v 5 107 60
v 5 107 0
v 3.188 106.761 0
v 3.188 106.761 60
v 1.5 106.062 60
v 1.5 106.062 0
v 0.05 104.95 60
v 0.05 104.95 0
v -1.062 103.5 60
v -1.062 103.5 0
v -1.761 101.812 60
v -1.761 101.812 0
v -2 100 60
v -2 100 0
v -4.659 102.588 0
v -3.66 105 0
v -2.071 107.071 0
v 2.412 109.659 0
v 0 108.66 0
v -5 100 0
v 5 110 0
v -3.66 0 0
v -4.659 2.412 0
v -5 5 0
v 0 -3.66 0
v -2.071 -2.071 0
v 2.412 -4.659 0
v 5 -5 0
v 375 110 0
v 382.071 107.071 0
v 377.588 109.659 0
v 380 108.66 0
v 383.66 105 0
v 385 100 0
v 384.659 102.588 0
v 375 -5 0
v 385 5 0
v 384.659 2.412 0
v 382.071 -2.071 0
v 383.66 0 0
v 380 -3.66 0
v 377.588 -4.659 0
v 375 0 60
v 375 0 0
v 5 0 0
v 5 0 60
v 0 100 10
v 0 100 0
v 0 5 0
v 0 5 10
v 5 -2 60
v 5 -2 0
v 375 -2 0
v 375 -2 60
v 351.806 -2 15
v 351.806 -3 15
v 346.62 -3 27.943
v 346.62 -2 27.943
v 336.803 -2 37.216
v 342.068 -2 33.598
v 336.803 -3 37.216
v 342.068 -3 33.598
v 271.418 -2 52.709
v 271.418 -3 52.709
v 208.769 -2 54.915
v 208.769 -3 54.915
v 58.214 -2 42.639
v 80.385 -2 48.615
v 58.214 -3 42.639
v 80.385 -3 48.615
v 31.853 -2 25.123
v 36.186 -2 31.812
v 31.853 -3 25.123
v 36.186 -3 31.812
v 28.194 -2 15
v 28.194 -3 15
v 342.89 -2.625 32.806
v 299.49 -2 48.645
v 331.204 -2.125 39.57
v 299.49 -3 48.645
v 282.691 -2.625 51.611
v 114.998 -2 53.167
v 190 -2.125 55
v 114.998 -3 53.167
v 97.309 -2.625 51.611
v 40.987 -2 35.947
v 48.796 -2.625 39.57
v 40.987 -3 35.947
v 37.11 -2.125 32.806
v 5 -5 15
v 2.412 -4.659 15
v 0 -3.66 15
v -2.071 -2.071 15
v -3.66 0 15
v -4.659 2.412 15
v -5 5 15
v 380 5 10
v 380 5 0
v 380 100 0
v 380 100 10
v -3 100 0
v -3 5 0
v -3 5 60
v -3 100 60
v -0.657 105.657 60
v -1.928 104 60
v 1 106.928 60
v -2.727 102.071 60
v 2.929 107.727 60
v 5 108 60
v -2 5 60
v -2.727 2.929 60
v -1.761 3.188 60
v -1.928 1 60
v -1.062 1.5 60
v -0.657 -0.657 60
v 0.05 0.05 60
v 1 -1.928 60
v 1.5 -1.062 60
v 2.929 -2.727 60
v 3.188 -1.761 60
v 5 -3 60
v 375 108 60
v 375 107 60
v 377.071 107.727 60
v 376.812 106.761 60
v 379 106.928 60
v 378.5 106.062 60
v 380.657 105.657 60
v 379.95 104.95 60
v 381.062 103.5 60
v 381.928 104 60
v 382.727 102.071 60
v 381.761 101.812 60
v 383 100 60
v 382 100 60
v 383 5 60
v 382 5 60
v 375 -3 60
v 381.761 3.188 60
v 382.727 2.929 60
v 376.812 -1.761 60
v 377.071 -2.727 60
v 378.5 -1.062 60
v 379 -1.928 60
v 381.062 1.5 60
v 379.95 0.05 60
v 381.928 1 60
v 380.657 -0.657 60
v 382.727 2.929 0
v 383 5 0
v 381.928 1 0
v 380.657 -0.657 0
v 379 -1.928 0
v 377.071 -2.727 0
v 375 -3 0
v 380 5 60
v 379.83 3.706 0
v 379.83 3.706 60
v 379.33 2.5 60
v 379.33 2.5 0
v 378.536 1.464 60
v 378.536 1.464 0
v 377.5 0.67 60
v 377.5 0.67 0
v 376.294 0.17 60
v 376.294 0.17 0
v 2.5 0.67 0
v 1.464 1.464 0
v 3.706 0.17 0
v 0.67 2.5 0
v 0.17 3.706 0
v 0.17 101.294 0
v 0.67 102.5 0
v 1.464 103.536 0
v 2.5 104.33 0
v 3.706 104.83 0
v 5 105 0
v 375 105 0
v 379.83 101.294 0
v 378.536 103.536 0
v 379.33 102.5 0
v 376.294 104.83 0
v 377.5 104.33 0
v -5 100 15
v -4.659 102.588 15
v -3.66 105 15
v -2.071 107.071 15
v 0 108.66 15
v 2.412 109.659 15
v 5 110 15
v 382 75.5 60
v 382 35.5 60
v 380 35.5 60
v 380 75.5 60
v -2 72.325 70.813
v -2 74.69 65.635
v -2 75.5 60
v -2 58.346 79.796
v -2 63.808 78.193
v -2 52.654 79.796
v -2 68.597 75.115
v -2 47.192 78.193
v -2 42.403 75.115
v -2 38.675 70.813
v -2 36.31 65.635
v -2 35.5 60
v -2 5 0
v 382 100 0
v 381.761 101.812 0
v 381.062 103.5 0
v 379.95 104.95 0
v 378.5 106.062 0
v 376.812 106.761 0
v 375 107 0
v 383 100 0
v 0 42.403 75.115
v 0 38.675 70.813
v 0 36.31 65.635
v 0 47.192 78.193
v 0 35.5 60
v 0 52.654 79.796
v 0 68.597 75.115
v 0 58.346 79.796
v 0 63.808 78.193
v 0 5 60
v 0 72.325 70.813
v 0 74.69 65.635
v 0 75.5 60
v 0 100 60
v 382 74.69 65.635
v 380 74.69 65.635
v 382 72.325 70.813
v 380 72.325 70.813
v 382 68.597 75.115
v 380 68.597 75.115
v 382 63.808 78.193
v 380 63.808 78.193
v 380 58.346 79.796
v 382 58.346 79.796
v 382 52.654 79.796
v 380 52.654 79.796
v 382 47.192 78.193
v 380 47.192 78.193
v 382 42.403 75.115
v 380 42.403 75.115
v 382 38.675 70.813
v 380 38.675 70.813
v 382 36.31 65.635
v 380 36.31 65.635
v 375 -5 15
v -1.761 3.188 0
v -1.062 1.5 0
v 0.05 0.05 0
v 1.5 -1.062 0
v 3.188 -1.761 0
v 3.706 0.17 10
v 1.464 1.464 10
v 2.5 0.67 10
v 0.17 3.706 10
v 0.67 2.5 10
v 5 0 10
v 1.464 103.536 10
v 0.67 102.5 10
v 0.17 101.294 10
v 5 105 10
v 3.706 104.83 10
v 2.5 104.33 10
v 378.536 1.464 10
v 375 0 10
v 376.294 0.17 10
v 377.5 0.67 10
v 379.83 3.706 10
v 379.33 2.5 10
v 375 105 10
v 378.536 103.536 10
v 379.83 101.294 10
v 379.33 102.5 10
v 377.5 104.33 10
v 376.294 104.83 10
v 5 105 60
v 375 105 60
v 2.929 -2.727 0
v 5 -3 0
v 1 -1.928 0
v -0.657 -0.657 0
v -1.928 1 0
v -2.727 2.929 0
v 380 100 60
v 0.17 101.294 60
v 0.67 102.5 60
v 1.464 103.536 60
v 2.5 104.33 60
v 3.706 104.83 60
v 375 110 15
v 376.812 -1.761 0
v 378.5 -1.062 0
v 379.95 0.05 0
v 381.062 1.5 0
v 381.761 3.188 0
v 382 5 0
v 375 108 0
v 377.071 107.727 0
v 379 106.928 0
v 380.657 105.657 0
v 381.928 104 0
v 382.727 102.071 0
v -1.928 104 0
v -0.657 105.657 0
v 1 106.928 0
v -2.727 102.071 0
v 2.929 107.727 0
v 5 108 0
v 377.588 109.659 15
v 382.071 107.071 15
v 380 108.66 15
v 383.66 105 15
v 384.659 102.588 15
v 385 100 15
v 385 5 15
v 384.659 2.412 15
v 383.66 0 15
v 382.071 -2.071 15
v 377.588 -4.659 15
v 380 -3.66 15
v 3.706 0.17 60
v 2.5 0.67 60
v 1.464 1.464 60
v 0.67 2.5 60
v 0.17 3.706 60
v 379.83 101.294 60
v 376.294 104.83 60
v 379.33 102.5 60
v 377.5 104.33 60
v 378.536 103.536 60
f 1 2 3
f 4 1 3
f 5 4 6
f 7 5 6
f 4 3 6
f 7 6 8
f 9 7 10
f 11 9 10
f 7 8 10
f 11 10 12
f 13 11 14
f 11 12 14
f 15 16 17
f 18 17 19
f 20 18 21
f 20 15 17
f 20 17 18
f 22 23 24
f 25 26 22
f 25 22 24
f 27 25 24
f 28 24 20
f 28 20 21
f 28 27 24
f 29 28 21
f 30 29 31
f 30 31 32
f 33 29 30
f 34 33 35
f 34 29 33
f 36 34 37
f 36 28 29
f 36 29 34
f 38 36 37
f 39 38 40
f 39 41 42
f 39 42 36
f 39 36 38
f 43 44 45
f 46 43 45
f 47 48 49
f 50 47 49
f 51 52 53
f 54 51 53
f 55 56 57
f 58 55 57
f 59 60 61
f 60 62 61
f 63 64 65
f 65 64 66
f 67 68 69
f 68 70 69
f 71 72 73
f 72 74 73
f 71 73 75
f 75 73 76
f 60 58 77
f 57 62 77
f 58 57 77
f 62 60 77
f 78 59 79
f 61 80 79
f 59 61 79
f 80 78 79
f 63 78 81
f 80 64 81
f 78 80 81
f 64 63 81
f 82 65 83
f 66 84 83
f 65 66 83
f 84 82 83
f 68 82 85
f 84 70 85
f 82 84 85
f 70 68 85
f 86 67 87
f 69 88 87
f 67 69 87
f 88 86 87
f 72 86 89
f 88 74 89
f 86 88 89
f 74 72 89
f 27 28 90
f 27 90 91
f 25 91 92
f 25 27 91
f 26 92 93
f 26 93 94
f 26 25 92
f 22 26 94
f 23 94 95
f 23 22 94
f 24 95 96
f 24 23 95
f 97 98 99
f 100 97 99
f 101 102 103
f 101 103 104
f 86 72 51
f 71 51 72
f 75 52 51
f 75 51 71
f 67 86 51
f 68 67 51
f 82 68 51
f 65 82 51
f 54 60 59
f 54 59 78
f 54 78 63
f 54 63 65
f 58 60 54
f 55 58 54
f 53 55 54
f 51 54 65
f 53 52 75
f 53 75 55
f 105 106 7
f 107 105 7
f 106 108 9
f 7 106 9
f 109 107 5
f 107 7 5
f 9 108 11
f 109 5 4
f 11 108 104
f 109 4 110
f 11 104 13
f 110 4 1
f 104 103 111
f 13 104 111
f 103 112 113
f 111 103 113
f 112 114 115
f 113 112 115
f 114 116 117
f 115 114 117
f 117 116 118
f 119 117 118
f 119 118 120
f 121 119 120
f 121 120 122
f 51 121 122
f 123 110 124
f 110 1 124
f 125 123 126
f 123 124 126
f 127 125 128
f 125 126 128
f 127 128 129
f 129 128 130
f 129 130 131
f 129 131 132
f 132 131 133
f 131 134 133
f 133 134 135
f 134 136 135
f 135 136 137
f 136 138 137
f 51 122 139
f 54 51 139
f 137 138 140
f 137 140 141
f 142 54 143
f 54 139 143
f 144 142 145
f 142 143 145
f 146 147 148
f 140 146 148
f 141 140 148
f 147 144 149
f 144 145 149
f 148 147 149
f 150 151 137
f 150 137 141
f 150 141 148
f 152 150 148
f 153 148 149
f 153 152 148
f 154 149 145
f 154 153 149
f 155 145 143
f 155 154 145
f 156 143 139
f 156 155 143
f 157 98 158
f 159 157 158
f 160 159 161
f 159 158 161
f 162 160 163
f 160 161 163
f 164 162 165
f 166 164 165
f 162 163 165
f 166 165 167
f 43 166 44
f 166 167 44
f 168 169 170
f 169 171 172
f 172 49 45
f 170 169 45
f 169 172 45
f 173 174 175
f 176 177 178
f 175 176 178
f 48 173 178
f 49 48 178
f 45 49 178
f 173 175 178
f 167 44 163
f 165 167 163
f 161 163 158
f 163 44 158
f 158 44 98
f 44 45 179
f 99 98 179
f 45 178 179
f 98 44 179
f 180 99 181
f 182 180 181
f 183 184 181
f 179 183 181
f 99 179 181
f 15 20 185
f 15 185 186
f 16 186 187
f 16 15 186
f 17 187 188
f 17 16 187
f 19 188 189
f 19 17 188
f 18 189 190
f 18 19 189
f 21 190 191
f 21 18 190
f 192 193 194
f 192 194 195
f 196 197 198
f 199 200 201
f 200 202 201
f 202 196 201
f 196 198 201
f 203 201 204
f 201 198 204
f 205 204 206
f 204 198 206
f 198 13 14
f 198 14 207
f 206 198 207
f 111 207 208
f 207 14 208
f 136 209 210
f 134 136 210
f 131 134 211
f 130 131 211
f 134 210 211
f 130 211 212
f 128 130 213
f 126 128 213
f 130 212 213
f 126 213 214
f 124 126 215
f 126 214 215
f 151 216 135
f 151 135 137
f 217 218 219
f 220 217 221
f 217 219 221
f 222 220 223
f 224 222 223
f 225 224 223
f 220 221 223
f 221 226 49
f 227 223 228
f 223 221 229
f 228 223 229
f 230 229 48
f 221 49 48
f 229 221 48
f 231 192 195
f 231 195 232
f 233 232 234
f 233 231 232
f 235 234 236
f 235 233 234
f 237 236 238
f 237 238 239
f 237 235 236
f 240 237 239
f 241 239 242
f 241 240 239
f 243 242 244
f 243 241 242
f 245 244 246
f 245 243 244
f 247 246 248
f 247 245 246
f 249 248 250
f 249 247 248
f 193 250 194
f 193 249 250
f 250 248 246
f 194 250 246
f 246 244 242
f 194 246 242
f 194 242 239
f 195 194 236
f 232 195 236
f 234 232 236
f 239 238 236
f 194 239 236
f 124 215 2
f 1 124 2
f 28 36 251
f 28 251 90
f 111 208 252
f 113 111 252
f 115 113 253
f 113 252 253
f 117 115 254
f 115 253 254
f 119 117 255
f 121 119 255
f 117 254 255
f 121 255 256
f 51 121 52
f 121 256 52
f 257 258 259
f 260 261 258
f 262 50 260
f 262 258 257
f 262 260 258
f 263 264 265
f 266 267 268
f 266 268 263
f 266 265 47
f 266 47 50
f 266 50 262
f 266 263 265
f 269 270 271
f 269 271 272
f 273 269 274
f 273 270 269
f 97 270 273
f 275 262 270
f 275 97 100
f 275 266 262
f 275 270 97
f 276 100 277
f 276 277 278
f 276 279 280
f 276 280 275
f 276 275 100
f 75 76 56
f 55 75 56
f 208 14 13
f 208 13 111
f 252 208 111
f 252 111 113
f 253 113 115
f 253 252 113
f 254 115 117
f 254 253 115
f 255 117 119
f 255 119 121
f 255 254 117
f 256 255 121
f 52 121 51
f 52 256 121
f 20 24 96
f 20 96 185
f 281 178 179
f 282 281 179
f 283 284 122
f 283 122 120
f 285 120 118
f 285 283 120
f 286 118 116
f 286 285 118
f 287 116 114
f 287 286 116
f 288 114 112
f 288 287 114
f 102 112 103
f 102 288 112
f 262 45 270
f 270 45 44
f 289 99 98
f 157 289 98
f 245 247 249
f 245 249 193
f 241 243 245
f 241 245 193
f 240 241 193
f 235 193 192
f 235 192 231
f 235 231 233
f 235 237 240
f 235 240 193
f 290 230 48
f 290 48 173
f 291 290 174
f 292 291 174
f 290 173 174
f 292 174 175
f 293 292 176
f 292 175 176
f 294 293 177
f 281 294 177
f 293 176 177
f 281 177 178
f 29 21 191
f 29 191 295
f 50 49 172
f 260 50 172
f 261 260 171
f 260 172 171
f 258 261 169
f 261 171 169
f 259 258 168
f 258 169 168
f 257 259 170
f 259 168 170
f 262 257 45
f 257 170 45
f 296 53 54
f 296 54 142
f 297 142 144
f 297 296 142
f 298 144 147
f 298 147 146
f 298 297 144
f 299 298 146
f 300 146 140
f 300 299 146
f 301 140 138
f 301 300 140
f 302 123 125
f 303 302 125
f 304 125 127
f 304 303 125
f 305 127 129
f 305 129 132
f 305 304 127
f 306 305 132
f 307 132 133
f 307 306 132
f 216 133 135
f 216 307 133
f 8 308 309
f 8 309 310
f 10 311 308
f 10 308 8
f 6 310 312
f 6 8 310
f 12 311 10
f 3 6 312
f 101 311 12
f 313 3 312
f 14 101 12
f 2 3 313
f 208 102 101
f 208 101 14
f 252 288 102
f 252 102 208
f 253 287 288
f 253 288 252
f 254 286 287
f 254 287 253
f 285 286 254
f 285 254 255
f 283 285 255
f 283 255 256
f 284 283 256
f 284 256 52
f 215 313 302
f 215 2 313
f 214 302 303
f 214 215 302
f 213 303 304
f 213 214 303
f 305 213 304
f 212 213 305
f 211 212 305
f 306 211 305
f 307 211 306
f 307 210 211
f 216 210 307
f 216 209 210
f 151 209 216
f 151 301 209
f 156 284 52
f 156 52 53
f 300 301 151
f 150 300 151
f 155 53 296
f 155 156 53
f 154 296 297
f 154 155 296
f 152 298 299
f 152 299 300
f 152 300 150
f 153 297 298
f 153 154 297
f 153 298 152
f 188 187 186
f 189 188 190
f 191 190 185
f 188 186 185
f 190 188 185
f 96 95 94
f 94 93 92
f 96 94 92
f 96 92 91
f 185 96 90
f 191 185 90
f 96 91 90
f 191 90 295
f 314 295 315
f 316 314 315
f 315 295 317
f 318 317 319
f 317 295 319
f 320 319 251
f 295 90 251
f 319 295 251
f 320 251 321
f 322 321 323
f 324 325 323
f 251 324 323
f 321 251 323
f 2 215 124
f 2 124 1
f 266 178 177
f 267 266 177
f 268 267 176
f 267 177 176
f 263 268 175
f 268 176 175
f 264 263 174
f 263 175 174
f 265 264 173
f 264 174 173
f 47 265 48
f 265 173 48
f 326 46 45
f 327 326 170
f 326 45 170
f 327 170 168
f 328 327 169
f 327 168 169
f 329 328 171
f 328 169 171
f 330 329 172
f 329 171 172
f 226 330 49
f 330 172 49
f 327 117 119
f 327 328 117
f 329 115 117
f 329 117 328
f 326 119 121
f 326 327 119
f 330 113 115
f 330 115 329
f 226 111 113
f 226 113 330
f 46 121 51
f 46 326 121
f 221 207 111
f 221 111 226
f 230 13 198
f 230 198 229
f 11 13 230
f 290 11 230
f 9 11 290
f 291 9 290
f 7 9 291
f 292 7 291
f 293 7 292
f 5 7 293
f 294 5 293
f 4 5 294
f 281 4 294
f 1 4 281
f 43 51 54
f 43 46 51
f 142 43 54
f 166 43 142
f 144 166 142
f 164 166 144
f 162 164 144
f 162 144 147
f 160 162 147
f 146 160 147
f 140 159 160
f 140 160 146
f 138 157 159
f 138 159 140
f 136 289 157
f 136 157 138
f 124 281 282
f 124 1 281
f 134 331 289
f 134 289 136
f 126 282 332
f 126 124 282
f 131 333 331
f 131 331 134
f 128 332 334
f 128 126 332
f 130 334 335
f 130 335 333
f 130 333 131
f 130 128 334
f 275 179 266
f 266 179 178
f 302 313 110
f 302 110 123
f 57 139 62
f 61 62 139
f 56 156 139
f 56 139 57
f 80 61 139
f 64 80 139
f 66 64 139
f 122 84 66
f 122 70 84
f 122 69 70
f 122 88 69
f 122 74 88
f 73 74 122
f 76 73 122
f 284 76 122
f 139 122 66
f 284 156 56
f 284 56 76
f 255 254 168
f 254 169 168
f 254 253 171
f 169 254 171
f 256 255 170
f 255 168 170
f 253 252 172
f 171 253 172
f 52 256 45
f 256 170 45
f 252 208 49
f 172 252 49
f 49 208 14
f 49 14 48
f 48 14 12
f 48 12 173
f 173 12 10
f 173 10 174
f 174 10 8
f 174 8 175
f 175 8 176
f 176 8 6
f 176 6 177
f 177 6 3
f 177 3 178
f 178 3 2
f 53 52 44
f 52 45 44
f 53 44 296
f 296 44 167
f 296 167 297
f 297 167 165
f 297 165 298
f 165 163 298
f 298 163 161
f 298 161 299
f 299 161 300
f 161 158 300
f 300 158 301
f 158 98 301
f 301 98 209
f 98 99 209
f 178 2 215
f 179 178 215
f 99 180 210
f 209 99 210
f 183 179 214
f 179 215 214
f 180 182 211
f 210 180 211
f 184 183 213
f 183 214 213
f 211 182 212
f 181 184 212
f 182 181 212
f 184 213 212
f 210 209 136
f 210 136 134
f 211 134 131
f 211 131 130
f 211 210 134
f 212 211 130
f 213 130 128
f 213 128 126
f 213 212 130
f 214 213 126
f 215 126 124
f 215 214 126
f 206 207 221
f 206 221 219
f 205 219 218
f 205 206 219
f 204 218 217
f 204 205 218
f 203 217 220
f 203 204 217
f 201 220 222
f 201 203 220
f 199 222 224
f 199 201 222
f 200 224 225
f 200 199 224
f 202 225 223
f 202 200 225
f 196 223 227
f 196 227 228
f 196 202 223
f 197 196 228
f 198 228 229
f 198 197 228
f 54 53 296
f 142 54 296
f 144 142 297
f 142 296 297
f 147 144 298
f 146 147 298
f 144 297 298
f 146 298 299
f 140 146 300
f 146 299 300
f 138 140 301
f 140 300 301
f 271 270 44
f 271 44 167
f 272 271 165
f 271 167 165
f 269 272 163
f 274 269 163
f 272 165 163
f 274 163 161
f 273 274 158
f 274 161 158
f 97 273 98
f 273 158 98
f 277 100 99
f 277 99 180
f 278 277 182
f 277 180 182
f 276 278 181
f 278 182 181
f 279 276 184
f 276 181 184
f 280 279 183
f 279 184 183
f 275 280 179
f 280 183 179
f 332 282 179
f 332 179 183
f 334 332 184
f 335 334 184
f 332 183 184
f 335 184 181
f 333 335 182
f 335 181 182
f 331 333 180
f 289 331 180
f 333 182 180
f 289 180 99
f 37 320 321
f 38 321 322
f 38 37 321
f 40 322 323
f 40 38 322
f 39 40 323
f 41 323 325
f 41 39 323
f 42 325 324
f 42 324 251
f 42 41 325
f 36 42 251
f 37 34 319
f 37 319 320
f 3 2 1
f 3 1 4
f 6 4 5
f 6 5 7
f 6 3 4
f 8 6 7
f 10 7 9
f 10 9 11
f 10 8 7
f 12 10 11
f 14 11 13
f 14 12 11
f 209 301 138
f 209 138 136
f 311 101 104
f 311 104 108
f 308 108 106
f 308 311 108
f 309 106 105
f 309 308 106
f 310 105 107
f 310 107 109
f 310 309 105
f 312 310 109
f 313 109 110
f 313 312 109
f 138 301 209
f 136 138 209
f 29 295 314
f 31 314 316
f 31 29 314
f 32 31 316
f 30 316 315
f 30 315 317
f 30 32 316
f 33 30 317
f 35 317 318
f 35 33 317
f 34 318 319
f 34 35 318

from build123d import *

# Parameters (mm, degrees)
F2_DEPTH  = 10
F3_DEPTH  = 60
F5_DEPTH  = 2
F7_DEPTH  = 2
F9_DEPTH  = 60
F11_DEPTH = 15
F13_DEPTH = 1


with BuildPart() as f2:
    # F0 (on Top) → F2 (new body)
    with BuildSketch(Plane.XY):
        with BuildLine():
            Line((375, 105), (5, 105))
            ThreePointArc((5, 105), (1.4644660941, 103.5355339059), (0, 100))
            Line((0, 100), (0, 5))
            ThreePointArc((0, 5), (1.4644660941, 1.4644660941), (5, 0))
            Line((5, 0), (375, 0))
            ThreePointArc((375, 0), (378.5355339059, 1.4644660941), (380, 5))
            Line((380, 5), (380, 100))
            ThreePointArc((380, 100), (378.5355339059, 103.5355339059), (375, 105))
        make_face()
    extrude(amount=F2_DEPTH)


with BuildPart() as f3:
    # F1 (on Top) → F3 (new body)
    with BuildSketch(Plane.XY):
        with BuildLine():
            Line((-2, 100), (-2, 5))
            ThreePointArc((-2, 5), (0.0502525317, 0.0502525317), (5, -2))
            Line((5, -2), (375, -2))
            ThreePointArc((375, -2), (379.9497474683, 0.0502525317), (382, 5))
            Line((382, 5), (382, 100))
            ThreePointArc((382, 100), (379.9497474683, 104.9497474683), (375, 107))
            Line((375, 107), (5, 107))
            ThreePointArc((5, 107), (0.0502525317, 104.9497474683), (-2, 100))
        make_face()
        with BuildLine():
            ThreePointArc((0, 100), (1.4644660941, 103.5355339059), (5, 105))
            Line((5, 105), (375, 105))
            ThreePointArc((375, 105), (378.5355339059, 103.5355339059), (380, 100))
            Line((380, 100), (380, 5))
            ThreePointArc((380, 5), (378.5355339059, 1.4644660941), (375, 0))
            Line((375, 0), (5, 0))
            ThreePointArc((5, 0), (1.4644660941, 1.4644660941), (0, 5))
            Line((0, 5), (0, 100))
        make_face(mode=Mode.SUBTRACT)
    extrude(amount=F3_DEPTH)

    # F4 (on face) → F5 (join)
    with BuildSketch(Plane(origin=(-2, 0, 0), x_dir=(0, -1, 0), z_dir=(-1, 0, 0))):
        with BuildLine():
            Line((-75.5, 60), (-35.5, 60))
            ThreePointArc((-35.5, 60), (-55.5, 80), (-75.5, 60))
        make_face()
    extrude(amount=-F5_DEPTH)


with BuildPart() as f7:
    # F6 (on face) → F7 (new body)
    with BuildSketch(Plane.YZ.offset(382)):
        with BuildLine():
            Line((35.5, 60), (75.5, 60))
            ThreePointArc((75.5, 60), (55.5, 80), (35.5, 60))
        make_face()
    extrude(amount=-F7_DEPTH)


with BuildPart() as f9:
    # F8 (on face) → F9 (new body)
    with BuildSketch(Plane(origin=(0, 0, 0), x_dir=(1, 0, 0), z_dir=(0, 0, -1))):
        with BuildLine():
            ThreePointArc((5, 3), (-0.6568542495, 0.6568542495), (-3, -5))
            Line((-3, -5), (-3, -100))
            ThreePointArc((-3, -100), (-0.6568542495, -105.6568542495), (5, -108))
            Line((5, -108), (375, -108))
            ThreePointArc((375, -108), (380.6568542495, -105.6568542495), (383, -100))
            Line((383, -100), (383, -5))
            ThreePointArc((383, -5), (380.6568542495, 0.6568542495), (375, 3))
            Line((375, 3), (5, 3))
        make_face()
        with BuildLine():
            ThreePointArc((5, -107), (0.0502525317, -104.9497474683), (-2, -100))
            Line((-2, -100), (-2, -5))
            ThreePointArc((-2, -5), (0.0502525317, -0.0502525317), (5, 2))
            Line((5, 2), (375, 2))
            ThreePointArc((375, 2), (379.9497474683, -0.0502525317), (382, -5))
            Line((382, -5), (382, -100))
            ThreePointArc((382, -100), (379.9497474683, -104.9497474683), (375, -107))
            Line((375, -107), (5, -107))
        make_face(mode=Mode.SUBTRACT)
    extrude(amount=-F9_DEPTH)

    # F12 (on face) → F13 (cut, symmetric)
    with BuildSketch(Plane.XZ.offset(3)):
        with BuildLine():
            add(Edge.make_bspline(
                [(28.1935859575, 15), (33.0186100511, 32.8053269822), (46.5795881553, 39.6828764907), (73.159449409, 46.7690119016), (98.9956348053, 53.6650429978), (154.2856206632, 55), (190, 55)],
                knots=[0, 0, 0, 0, 0.2238593677, 0.4181327763, 0.619261247, 1, 1, 1, 1], degree=3))
            Line((28.1935859575, 15), (190, 15))
            Line((190, 15), (190, 55))
        make_face()
        with BuildLine():
            add(Edge.make_bspline(
                [(351.8064140425, 15), (346.9813899489, 32.8053269822), (333.4204118447, 39.6828764907), (306.840550591, 46.7690119016), (281.0043651947, 53.6650429978), (225.7143793368, 55), (190, 55)],
                knots=[0, 0, 0, 0, 0.2238593677, 0.4181327763, 0.619261247, 1, 1, 1, 1], degree=3))
            Line((190, 55), (190, 15))
            Line((190, 15), (351.8064140425, 15))
        make_face()
    extrude(amount=F13_DEPTH, both=True, mode=Mode.SUBTRACT)


with BuildPart() as f11:
    # F10 (on face) → F11 (new body)
    with BuildSketch(Plane(origin=(0, 0, 0), x_dir=(1, 0, 0), z_dir=(0, 0, -1))):
        with BuildLine():
            ThreePointArc((5, 5), (-2.0710678119, 2.0710678119), (-5, -5))
            Line((-5, -5), (-5, -100))
            ThreePointArc((-5, -100), (-2.0710678119, -107.0710678119), (5, -110))
            Line((5, -110), (375, -110))
            ThreePointArc((375, -110), (382.0710678119, -107.0710678119), (385, -100))
            Line((385, -100), (385, -5))
            ThreePointArc((385, -5), (382.0710678119, 2.0710678119), (375, 5))
            Line((375, 5), (5, 5))
        make_face()
    extrude(amount=-F11_DEPTH)


solid = Compound([f2.part, f3.part, f7.part, f9.part, f11.part])
